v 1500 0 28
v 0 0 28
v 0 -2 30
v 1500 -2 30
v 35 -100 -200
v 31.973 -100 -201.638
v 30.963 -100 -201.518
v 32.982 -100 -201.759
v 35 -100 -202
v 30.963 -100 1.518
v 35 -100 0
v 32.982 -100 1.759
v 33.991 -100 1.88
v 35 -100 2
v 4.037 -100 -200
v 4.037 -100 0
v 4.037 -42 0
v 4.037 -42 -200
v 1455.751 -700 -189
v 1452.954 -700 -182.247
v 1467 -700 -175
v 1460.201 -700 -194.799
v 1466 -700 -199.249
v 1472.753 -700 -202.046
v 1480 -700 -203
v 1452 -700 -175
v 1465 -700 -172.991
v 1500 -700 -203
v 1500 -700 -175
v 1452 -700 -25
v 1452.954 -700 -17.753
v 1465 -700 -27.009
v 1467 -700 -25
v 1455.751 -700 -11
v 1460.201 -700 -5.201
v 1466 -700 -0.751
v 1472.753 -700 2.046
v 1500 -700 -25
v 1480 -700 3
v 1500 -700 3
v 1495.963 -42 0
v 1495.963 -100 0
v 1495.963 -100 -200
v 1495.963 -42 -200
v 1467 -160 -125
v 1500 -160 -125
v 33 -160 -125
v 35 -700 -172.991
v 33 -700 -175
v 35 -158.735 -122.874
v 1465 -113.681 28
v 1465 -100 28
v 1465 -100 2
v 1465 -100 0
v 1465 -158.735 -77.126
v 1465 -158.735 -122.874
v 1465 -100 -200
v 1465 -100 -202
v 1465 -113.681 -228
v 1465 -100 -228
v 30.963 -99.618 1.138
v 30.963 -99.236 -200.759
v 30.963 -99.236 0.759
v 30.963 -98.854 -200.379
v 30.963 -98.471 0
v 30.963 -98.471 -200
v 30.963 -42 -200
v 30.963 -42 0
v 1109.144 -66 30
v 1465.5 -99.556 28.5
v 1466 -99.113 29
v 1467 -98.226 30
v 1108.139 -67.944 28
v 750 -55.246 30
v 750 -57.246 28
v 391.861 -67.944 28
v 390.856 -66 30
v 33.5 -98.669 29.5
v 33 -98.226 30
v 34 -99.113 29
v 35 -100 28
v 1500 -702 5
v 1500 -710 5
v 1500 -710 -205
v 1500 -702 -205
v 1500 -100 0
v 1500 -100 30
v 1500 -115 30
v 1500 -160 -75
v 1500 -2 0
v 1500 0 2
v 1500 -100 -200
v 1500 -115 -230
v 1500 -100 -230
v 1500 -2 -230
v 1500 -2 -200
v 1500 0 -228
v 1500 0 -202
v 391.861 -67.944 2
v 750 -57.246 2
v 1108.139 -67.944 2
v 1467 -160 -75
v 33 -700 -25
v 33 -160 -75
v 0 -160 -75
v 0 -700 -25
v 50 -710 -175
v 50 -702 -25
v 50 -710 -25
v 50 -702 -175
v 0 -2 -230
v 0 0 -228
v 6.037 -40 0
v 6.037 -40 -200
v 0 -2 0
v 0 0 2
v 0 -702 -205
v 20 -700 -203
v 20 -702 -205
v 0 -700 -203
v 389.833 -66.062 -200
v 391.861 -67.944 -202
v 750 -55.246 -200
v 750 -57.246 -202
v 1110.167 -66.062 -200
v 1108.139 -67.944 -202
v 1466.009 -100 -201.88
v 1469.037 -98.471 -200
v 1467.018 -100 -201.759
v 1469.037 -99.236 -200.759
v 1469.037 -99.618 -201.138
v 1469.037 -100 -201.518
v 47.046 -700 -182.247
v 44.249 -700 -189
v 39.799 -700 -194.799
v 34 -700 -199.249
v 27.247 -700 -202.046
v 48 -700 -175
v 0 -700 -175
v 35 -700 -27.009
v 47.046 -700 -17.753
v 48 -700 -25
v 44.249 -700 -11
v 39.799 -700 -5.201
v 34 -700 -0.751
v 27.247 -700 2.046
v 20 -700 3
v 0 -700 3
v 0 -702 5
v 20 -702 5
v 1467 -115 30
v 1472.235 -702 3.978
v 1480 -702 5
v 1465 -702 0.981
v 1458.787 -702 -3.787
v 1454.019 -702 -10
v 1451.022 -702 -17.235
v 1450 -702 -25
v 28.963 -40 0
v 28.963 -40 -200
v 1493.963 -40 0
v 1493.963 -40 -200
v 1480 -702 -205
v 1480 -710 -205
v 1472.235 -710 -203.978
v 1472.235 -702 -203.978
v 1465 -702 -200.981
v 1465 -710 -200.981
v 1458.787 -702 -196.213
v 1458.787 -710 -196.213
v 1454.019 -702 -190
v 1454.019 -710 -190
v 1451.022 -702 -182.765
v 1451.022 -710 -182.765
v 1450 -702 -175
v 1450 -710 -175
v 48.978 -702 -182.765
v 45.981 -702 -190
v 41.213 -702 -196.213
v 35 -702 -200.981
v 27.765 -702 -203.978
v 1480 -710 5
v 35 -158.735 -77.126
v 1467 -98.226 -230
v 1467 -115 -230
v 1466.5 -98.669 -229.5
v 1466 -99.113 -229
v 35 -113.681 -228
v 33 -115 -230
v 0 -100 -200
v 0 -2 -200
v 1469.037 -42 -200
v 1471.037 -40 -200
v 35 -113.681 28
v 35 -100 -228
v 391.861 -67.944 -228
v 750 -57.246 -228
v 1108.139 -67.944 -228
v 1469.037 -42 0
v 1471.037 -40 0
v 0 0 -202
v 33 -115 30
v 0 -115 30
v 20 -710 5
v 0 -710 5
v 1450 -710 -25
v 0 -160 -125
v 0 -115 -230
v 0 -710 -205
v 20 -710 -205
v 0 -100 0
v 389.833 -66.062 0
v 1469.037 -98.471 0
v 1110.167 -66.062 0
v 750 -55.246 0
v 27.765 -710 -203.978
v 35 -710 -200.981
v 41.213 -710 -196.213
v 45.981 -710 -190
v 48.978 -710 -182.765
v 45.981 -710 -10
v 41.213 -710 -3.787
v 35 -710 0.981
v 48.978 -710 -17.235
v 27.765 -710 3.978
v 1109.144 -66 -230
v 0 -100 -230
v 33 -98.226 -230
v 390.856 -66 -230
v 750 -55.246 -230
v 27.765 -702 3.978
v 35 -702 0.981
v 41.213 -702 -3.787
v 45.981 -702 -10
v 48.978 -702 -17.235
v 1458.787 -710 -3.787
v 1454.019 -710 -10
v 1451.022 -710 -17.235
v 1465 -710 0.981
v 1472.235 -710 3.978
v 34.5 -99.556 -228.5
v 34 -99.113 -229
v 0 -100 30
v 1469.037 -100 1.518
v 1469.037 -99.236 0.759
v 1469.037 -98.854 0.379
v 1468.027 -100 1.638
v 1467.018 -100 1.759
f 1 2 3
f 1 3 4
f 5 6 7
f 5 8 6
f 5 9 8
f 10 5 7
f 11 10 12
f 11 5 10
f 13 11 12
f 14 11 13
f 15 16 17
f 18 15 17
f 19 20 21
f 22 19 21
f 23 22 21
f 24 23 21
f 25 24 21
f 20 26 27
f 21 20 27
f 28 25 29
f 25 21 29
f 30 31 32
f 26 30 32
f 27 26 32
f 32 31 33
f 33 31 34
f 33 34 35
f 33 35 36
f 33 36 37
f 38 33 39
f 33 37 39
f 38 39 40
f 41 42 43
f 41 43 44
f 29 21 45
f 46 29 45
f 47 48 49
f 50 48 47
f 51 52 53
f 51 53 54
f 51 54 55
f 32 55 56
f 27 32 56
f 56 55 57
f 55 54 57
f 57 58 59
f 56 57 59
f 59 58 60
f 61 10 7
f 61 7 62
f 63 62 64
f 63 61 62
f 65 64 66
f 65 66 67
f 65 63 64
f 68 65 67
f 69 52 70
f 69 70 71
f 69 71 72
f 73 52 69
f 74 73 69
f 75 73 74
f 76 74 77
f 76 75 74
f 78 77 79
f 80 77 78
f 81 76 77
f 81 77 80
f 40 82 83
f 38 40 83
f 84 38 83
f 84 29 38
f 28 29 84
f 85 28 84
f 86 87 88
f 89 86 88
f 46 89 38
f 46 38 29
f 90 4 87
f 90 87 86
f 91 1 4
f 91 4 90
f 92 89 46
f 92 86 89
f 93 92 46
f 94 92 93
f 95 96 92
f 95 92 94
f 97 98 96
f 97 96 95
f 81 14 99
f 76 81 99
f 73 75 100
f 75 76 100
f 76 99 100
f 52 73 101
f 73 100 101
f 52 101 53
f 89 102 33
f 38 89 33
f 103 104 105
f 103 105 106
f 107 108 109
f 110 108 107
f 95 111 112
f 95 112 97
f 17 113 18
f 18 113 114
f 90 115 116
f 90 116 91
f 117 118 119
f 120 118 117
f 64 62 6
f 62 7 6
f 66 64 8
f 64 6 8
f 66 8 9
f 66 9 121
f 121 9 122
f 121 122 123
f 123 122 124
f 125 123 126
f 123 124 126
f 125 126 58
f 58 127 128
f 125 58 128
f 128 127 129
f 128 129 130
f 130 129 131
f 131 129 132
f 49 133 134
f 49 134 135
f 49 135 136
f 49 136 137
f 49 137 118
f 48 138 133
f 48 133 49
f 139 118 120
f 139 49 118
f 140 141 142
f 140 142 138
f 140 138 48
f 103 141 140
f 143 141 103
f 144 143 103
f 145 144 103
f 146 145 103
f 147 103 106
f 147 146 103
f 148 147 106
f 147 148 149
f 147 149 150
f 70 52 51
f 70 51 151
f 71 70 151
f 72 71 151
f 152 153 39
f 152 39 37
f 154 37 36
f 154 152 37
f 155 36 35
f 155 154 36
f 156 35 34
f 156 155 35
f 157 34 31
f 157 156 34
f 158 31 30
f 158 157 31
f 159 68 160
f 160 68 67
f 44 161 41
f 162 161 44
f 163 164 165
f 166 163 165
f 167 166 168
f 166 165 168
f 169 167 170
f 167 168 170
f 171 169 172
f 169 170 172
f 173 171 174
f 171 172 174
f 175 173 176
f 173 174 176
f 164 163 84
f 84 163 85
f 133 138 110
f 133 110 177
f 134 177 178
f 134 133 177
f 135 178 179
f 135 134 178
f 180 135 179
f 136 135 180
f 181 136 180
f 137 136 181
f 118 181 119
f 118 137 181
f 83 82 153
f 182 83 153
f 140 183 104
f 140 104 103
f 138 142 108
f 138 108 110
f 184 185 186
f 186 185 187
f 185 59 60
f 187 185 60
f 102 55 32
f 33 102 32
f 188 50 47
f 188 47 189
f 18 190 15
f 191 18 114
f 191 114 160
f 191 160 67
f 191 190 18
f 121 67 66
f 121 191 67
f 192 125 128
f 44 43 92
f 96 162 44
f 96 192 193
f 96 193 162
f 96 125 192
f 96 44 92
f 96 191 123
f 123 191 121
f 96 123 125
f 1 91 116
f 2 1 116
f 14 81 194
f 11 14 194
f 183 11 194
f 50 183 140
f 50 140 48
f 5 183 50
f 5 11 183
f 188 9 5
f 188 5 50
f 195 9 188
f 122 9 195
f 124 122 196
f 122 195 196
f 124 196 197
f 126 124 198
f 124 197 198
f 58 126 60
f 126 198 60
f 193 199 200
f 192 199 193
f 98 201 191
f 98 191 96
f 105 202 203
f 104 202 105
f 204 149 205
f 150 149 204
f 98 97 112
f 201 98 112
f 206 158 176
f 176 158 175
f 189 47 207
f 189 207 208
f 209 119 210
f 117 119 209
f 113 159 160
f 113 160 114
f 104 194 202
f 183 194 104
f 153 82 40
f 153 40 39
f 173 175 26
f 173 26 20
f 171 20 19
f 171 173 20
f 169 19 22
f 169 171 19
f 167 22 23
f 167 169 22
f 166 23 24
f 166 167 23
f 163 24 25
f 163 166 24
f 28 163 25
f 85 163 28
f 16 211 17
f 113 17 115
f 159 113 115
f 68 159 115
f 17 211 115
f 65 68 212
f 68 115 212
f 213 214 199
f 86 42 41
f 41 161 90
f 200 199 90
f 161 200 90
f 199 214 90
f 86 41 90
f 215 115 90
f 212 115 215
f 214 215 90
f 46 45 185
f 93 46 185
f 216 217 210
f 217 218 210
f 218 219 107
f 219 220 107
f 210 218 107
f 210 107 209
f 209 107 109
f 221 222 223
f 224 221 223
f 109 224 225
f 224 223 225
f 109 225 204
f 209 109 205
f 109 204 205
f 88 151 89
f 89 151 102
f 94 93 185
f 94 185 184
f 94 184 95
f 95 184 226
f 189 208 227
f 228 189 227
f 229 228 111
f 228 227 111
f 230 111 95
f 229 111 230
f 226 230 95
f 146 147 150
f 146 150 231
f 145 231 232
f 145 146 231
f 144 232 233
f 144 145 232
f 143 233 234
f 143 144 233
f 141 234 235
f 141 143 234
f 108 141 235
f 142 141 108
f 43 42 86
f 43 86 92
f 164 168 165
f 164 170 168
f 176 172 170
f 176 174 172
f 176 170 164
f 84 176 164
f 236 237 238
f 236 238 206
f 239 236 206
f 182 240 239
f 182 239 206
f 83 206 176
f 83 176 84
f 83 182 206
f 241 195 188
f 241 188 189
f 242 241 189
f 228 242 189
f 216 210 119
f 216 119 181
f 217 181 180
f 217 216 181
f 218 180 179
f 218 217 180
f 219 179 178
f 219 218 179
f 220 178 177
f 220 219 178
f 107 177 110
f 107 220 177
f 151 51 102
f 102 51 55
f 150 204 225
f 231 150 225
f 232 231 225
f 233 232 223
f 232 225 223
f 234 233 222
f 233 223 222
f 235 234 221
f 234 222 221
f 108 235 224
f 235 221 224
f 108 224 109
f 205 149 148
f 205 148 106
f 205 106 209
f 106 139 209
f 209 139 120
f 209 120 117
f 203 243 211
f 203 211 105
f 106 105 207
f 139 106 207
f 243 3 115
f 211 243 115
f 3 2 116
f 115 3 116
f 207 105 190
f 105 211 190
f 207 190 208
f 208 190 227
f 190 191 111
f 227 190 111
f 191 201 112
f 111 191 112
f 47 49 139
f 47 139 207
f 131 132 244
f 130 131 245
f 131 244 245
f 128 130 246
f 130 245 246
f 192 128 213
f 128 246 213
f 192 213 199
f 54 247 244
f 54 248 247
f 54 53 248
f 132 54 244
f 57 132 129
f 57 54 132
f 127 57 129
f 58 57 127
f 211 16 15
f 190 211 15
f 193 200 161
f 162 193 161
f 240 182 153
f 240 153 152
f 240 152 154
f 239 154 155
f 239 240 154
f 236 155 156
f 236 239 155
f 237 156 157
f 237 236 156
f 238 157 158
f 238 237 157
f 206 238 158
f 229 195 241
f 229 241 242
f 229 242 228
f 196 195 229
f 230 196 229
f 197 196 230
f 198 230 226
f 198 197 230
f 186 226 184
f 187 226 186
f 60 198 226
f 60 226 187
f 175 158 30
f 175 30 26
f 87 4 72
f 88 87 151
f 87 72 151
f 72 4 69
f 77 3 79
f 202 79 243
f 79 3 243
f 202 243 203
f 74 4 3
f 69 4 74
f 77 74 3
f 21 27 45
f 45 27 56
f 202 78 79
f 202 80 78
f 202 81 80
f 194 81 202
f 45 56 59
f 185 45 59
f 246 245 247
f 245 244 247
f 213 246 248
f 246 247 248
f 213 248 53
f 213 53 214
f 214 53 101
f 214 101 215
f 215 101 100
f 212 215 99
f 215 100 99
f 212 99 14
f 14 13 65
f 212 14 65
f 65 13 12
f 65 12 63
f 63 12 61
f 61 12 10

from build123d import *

# Parameters (mm, degrees)
BOSS_EXTRUDE1_DEPTH      = 30
SKETCH2_W                = 26.926999998
SKETCH2_H                = 60
BOSS_EXTRUDE2_DEPTH      = 200
BOSS_EXTRUDE3_START      = 30
BOSS_EXTRUDE3_DEPTH      = 30
BOSS_EXTRUDE4_DEPTH      = 4.0365
BOSS_EXTRUDE4_DEPTH_BACK = 30.9635
BOSS_EXTRUDE5_DEPTH      = 10
FILLET1_R                = 30
SKETCH7_W                = 260
SKETCH7_H                = 710
CUT_EXTRUDE1_DEPTH       = 1059.06427026
CHAMFER1_SIZE            = 2
CHAMFER2_SIZE            = 2
CHAMFER3_SIZE            = 2
CHAMFER4_SIZE            = 2
CHAMFER6_SIZE            = 2


with BuildPart() as part:
    # Sketch1 → Boss-Extrude1 (new body)
    with BuildSketch(Plane.XY):
        with BuildLine():
            Line((0, 0), (1500, 0))
            Line((1500, 0), (1500, -100))
            Line((1500, -100), (1465, -100))
            ThreePointArc((1465, -100), (750, -57.245588357), (35, -100))
            Line((35, -100), (0, -100))
            Line((0, -100), (0, 0))
        make_face()
    extrude(amount=BOSS_EXTRUDE1_DEPTH)

    # Sketch2 → Boss-Extrude2 (add)
    with BuildSketch(Plane(origin=(0, 0, 0), x_dir=(-1, 0, 0), z_dir=(0, 0, -1))):
        with Locations((-1482.5, -70)):
            Rectangle(SKETCH2_W, SKETCH2_H)
        with Locations((-17.5, -70)):
            Rectangle(SKETCH2_W, SKETCH2_H)
    extrude(amount=BOSS_EXTRUDE2_DEPTH)

    # Sketch3 → Boss-Extrude3 (add)
    with BuildSketch(Plane(origin=(0, 0, -200), x_dir=(-1, 0, 0), z_dir=(0, 0, -1)).offset(BOSS_EXTRUDE3_START)):
        with BuildLine():
            Line((0, -100), (0, 0))
            Line((0, 0), (-1500, 0))
            Line((-1500, 0), (-1500, -100))
            Line((-1500, -100), (-1465, -100))
            ThreePointArc((-1465, -100), (-750, -57.245588357), (-35, -100))
            Line((-35, -100), (0, -100))
        make_face()
    extrude(amount=-BOSS_EXTRUDE3_DEPTH)

    # Sketch5 → Boss-Extrude4 (add, two sides: drawn at the far end of the back side and taken through both)
    with BuildSketch(Plane.ZY.offset(-4.036500001).offset(-BOSS_EXTRUDE4_DEPTH_BACK)):
        Polygon((-200, -100), (0, -100), (30, -100), (30, -115), (-75, -160), (-25, -700), (-100, -700), (-175, -700), (-125, -160), (-230, -115), (-230, -100), align=None)
    extrude(amount=BOSS_EXTRUDE4_DEPTH + BOSS_EXTRUDE4_DEPTH_BACK)

    # Sketch6 → Boss-Extrude5 (add)
    with BuildSketch(Plane.XZ.offset(700)):
        Polygon((0, -25), (0, 5), (50, 5), (50, -205), (0, -205), (0, -175), align=None)
    extrude(amount=BOSS_EXTRUDE5_DEPTH)

    # Fillet1
    fillet1_edges = [part.edges().sort_by_distance(p)[0] for p in [
        (50, -705, -205),
        (50, -705, 5),
    ]]
    fillet(fillet1_edges, radius=FILLET1_R)

    # Sketch7 → Cut-Extrude1 (cut, through all)
    with BuildSketch(Plane(origin=(750, 0, 0), x_dir=(0, 0, -1), z_dir=(1, 0, 0))):
        with Locations((100, -355)):
            Rectangle(SKETCH7_W, SKETCH7_H)
    extrude(amount=CUT_EXTRUDE1_DEPTH, mode=Mode.SUBTRACT)

    # Mirror2: part across plane


with BuildPart() as part_1:
    add(part.part)
    add(part.part.mirror(Plane(origin=(750, 0, 0), x_dir=(0, 0, 1), z_dir=(1, 0, 0))))

    # Chamfer1
    chamfer1_edges = [part_1.edges().sort_by_distance(p)[0] for p in [
        (750, 0, 30),
        (750, 0, 0),
        (750, 0, -200),
        (750, 0, -230),
    ]]
    chamfer(chamfer1_edges, length=CHAMFER1_SIZE)

    # Chamfer2
    chamfer2_edges = [part_1.edges().sort_by_distance(p)[0] for p in [
        (1495.963499999, -40, -100),
        (1469.036500001, -40, -100),
        (4.036500001, -40, -100),
        (30.963499999, -40, -100),
    ]]
    chamfer(chamfer2_edges, length=CHAMFER2_SIZE)

    # Chamfer3
    chamfer3_edges = [part_1.edges().sort_by_distance(p)[0] for p in [
        (1464.999999999, -107.5, -230),
        (1464.999999999, -137.5, -177.5),
        (1464.999999999, -430, -150),
        (1464.999999999, -430, -50),
        (1464.999999999, -137.5, -22.5),
        (1464.999999999, -107.5, 30),
        (35.000000001, -107.5, 30),
        (35.000000001, -137.5, -22.5),
        (35.000000001, -430, -50),
        (35.000000001, -430, -150),
        (35.000000001, -137.5, -177.5),
        (35.000000001, -107.5, -230),
    ]]
    chamfer(chamfer3_edges, length=CHAMFER3_SIZE)

    # Chamfer4
    chamfer4_edges = [part_1.edges().sort_by_distance(p)[0] for p in [
        (50, -700, -100),
        (10, -700, 5),
        (41.213203436, -700, -3.786796564),
        (41.213203436, -700, -196.213203436),
        (1450, -700, -100),
        (1490, -700, 5),
        (1490, -700, -205),
        (1458.786796564, -700, -196.213203436),
        (1458.786796564, -700, -3.786796564),
        (10, -700, -205),
    ]]
    chamfer(chamfer4_edges, length=CHAMFER4_SIZE)

    # Chamfer6
    # the kernel refuses this chamfer: 2 mm, written as the material it takes off along each edge
    with BuildSketch(Plane(origin=(750, -6057.245588357, 30), x_dir=(0.1203510488799101, 0.9927313962162704, 0), z_dir=(0.9927313962162704, -0.1203510488799101, 0))) as chamfer6_piece_1_section:
        Polygon((6000 + CHAMFER6_SIZE, 0), (6000, -CHAMFER6_SIZE), (6000, 0), align=None)
    chamfer6_piece_1 = revolve(axis=Axis((750, -6057.245588357, 30), (0, 0, 1)), revolution_arc=13.824726066, mode=Mode.PRIVATE)
    chamfer6_piece_1 = split(chamfer6_piece_1, bisect_by=Plane(origin=(1466.125003015, -99.334691053, 29.125003016), z_dir=(-0.7071067811865476, 0, 0.7071067811865476)), keep=Keep.TOP, mode=Mode.PRIVATE)
    chamfer6_piece_1 = split(chamfer6_piece_1, bisect_by=Plane(origin=(749.625001683, -99.334691053, -686.625001682), z_dir=(0.7071067811865476, 0, 0.7071067811865476)), keep=Keep.TOP, mode=Mode.PRIVATE)
    add(chamfer6_piece_1, mode=Mode.SUBTRACT)
    with BuildSketch(Plane(origin=(750, -6057.245588357, -200), x_dir=(-0.12001774996908876, 0.9927717460183672, 0), z_dir=(-0.9927717460183672, -0.12001774996908876, 0))) as chamfer6_piece_2_section:
        Polygon((6000 + CHAMFER6_SIZE, 0), (6000, CHAMFER6_SIZE), (6000, 0), align=None)
    chamfer6_piece_2 = revolve(axis=Axis((750, -6057.245588357, -200), (0, 0, -1)), revolution_arc=13.786253962, mode=Mode.PRIVATE)
    chamfer6_piece_2 = split(chamfer6_piece_2, bisect_by=Plane(origin=(33.165042668, -100, -200.593649662), z_dir=(0, 1, 0)), keep=Keep.TOP, mode=Mode.PRIVATE)
    chamfer6_piece_2 = split(chamfer6_piece_2, bisect_by=Plane(origin=(1469.036500001, -99.402070314, -200.593649662), z_dir=(-1, 0, 0)), keep=Keep.TOP, mode=Mode.PRIVATE)
    chamfer6_piece_2 = split(chamfer6_piece_2, bisect_by=Plane(origin=(30.963499999, -99.402070314, -200.593649662), z_dir=(1, 0, 0)), keep=Keep.TOP, mode=Mode.PRIVATE)
    add(chamfer6_piece_2, mode=Mode.SUBTRACT)
    with BuildSketch(Plane(origin=(750, -6057.245588357, 0), x_dir=(0.12001774996908958, 0.9927717460183672, 0), z_dir=(0.9927717460183672, -0.12001774996908958, 0))) as chamfer6_piece_3_section:
        Polygon((6000 + CHAMFER6_SIZE, 0), (6000, CHAMFER6_SIZE), (6000, 0), align=None)
    chamfer6_piece_3 = revolve(axis=Axis((750, -6057.245588357, 0), (0, 0, 1)), revolution_arc=13.786253962, mode=Mode.PRIVATE)
    chamfer6_piece_3 = split(chamfer6_piece_3, bisect_by=Plane(origin=(1466.834957332, -100, 0.593649662), z_dir=(0, 1, 0)), keep=Keep.TOP, mode=Mode.PRIVATE)
    chamfer6_piece_3 = split(chamfer6_piece_3, bisect_by=Plane(origin=(1469.036500001, -99.402070314, 0.593649662), z_dir=(-1, 0, 0)), keep=Keep.TOP, mode=Mode.PRIVATE)
    chamfer6_piece_3 = split(chamfer6_piece_3, bisect_by=Plane(origin=(30.963499999, -99.402070314, 0.593649662), z_dir=(1, 0, 0)), keep=Keep.TOP, mode=Mode.PRIVATE)
    add(chamfer6_piece_3, mode=Mode.SUBTRACT)
    with BuildSketch(Plane(origin=(750, -6057.245588357, -230), x_dir=(-0.12035104887990915, 0.9927313962162705, 0), z_dir=(-0.9927313962162705, -0.12035104887990915, 0))) as chamfer6_piece_4_section:
        Polygon((6000 + CHAMFER6_SIZE, 0), (6000, -CHAMFER6_SIZE), (6000, 0), align=None)
    chamfer6_piece_4 = revolve(axis=Axis((750, -6057.245588357, -230), (0, 0, -1)), revolution_arc=13.824726066, mode=Mode.PRIVATE)
    chamfer6_piece_4 = split(chamfer6_piece_4, bisect_by=Plane(origin=(750.374998317, -99.334691053, 486.625001682), z_dir=(-0.7071067811865476, 0, -0.7071067811865476)), keep=Keep.TOP, mode=Mode.PRIVATE)
    chamfer6_piece_4 = split(chamfer6_piece_4, bisect_by=Plane(origin=(33.874996985, -99.334691053, -229.125003016), z_dir=(0.7071067811865476, 0, -0.7071067811865476)), keep=Keep.TOP, mode=Mode.PRIVATE)
    add(chamfer6_piece_4, mode=Mode.SUBTRACT)


solid = part_1.part
